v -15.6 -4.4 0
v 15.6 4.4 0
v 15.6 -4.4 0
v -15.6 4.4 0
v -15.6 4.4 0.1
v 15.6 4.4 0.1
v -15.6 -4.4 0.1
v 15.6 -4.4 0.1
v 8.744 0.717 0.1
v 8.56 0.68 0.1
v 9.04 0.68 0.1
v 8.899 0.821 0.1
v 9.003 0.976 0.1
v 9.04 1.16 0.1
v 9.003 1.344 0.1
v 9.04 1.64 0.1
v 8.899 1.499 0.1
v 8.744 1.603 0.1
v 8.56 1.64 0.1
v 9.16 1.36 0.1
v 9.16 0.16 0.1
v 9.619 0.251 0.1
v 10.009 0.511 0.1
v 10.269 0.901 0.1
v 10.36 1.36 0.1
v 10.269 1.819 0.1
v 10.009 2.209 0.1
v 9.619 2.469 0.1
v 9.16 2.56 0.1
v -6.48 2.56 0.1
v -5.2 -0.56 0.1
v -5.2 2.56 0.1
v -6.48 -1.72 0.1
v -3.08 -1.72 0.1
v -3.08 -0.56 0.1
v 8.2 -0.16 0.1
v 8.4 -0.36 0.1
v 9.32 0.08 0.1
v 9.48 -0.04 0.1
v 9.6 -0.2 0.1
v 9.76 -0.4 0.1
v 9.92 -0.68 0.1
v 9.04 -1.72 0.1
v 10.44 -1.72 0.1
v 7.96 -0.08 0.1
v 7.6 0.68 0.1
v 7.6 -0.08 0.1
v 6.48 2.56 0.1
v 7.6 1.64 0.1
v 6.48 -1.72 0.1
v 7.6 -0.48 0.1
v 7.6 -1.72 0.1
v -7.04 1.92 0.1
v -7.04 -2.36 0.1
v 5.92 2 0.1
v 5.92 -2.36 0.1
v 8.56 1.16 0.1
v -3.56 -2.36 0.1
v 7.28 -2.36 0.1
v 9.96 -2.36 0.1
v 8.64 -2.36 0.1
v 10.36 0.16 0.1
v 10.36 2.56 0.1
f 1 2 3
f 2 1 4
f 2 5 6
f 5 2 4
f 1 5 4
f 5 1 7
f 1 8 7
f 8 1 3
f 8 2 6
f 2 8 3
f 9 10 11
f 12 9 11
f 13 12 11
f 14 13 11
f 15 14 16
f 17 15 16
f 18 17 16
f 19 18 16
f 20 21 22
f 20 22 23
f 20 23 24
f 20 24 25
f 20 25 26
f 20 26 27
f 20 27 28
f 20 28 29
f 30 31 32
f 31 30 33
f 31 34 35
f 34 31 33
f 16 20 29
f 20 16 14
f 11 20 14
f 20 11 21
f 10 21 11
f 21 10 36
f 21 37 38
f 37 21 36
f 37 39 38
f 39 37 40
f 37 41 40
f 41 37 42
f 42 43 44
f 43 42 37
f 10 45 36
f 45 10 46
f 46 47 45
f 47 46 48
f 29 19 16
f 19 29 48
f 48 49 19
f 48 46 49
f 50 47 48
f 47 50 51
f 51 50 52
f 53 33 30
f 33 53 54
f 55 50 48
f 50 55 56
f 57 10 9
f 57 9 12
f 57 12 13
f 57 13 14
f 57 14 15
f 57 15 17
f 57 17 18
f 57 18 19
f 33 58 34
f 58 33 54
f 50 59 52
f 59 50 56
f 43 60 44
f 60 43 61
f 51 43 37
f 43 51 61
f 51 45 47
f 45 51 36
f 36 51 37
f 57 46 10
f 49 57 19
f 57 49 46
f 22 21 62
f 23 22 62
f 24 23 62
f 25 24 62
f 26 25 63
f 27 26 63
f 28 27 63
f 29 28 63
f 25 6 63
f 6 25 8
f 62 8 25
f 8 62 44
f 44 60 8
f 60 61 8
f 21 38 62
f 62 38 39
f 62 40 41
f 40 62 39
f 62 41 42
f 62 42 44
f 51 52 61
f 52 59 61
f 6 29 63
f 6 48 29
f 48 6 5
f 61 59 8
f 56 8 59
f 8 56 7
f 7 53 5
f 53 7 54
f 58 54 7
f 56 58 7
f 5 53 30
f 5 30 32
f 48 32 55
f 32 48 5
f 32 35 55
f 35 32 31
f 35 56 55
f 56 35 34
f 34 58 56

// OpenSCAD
// file: ../p/4-4edge.scad
use <../lib.scad>
$fa=1; $fs=0.2;
function ldraw_lib__4_4edge(realsolid=false) = [
// 0 Circle 1.0
// 0 Name: 4-4edge.dat
// 0 Author: James Jessiman
// 0 !LDRAW_ORG Primitive UPDATE 2017-01
// 0 !LICENSE Licensed under CC BY 2.0 and CC BY 4.0 : see CAreadme.txt
// 
// 0 BFC CERTIFY CCW
  [0,"BFC","CERTIFY"],
  [0,"BFC","CCW"],
// 
// 0 !HISTORY 1998-12-15 [PTadmin] Official Update 1998-10
// 0 !HISTORY 2005-12-28 [PTadmin] Official Update 2005-01
// 0 !HISTORY 2007-06-24 [PTadmin] Header formatted for Contributor Agreement
// 0 !HISTORY 2008-07-01 [PTadmin] Official Update 2008-01
// 0 !HISTORY 2017-01-15 [Steffen] BFCed
// 0 !HISTORY 2017-12-30 [PTadmin] Official Update 2017-01
// 
// 
// 2 24 1 0 0 0.9239 0 0.3827
  [2,24,1,0,0,0.9239,0,0.3827],
// 2 24 0.9239 0 0.3827 0.7071 0 0.7071
  [2,24,0.9239,0,0.3827,0.7071,0,0.7071],
// 2 24 0.7071 0 0.7071 0.3827 0 0.9239
  [2,24,0.7071,0,0.7071,0.3827,0,0.9239],
// 2 24 0.3827 0 0.9239 0 0 1
  [2,24,0.3827,0,0.9239,0,0,1],
// 2 24 0 0 1 -0.3827 0 0.9239
  [2,24,0,0,1,-0.3827,0,0.9239],
// 2 24 -0.3827 0 0.9239 -0.7071 0 0.7071
  [2,24,-0.3827,0,0.9239,-0.7071,0,0.7071],
// 2 24 -0.7071 0 0.7071 -0.9239 0 0.3827
  [2,24,-0.7071,0,0.7071,-0.9239,0,0.3827],
// 2 24 -0.9239 0 0.3827 -1 0 -0
  [2,24,-0.9239,0,0.3827,-1,0,-0],
// 2 24 -1 0 -0 -0.9239 0 -0.3827
  [2,24,-1,0,-0,-0.9239,0,-0.3827],
// 2 24 -0.9239 0 -0.3827 -0.7071 0 -0.7071
  [2,24,-0.9239,0,-0.3827,-0.7071,0,-0.7071],
// 2 24 -0.7071 0 -0.7071 -0.3827 0 -0.9239
  [2,24,-0.7071,0,-0.7071,-0.3827,0,-0.9239],
// 2 24 -0.3827 0 -0.9239 0 0 -1
  [2,24,-0.3827,0,-0.9239,0,0,-1],
// 2 24 0 0 -1 0.3827 0 -0.9239
  [2,24,0,0,-1,0.3827,0,-0.9239],
// 2 24 0.3827 0 -0.9239 0.7071 0 -0.7071
  [2,24,0.3827,0,-0.9239,0.7071,0,-0.7071],
// 2 24 0.7071 0 -0.7071 0.9239 0 -0.3827
  [2,24,0.7071,0,-0.7071,0.9239,0,-0.3827],
// 2 24 0.9239 0 -0.3827 1 0 0
  [2,24,0.9239,0,-0.3827,1,0,0],
];
module ldraw_lib__4_4edge(step=0, col=false, unit=2/5, alt=false, line=0.2, solid=!$preview)
    makepoly(ldraw_lib__4_4edge(solid), step=step, col=col, unit=unit, alt=alt, line=line, solid=solid);
ldraw_lib__4_4edge(line=0.2);
// file: ../p/4-4disc.scad
use <../lib.scad>
$fa=1; $fs=0.2;
function ldraw_lib__4_4disc(realsolid=false) = [
// 0 Disc 1.0
// 0 Name: 4-4disc.dat
// 0 Author: James Jessiman
// 0 !LDRAW_ORG Primitive UPDATE 2002-02
// 0 !LICENSE Licensed under CC BY 2.0 and CC BY 4.0 : see CAreadme.txt
// 
// 0 BFC CERTIFY CCW
  [0,"BFC","CERTIFY"],
  [0,"BFC","CCW"],
// 
// 0 !HISTORY 1998-12-15 [PTadmin] Official Update 1998-10
// 0 !HISTORY 2002-03-23 [sbliss] Added BFC statement
// 0 !HISTORY 2002-04-25 [PTadmin] Official Update 2002-02
// 0 !HISTORY 2007-06-24 [PTadmin] Header formatted for Contributor Agreement
// 0 !HISTORY 2008-07-01 [PTadmin] Official Update 2008-01
// 
// 
// 3 16 0 0 0 1 0 0 0.9239 0 0.3827
  [3,16,0,0,0,1,0,0,0.9239,0,0.3827],
// 3 16 0 0 0 0.9239 0 0.3827 0.7071 0 0.7071
  [3,16,0,0,0,0.9239,0,0.3827,0.7071,0,0.7071],
// 3 16 0 0 0 0.7071 0 0.7071 0.3827 0 0.9239
  [3,16,0,0,0,0.7071,0,0.7071,0.3827,0,0.9239],
// 3 16 0 0 0 0.3827 0 0.9239 0 0 1
  [3,16,0,0,0,0.3827,0,0.9239,0,0,1],
// 3 16 0 0 0 0 0 1 -0.3827 0 0.9239
  [3,16,0,0,0,0,0,1,-0.3827,0,0.9239],
// 3 16 0 0 0 -0.3827 0 0.9239 -0.7071 0 0.7071
  [3,16,0,0,0,-0.3827,0,0.9239,-0.7071,0,0.7071],
// 3 16 0 0 0 -0.7071 0 0.7071 -0.9239 0 0.3827
  [3,16,0,0,0,-0.7071,0,0.7071,-0.9239,0,0.3827],
// 3 16 0 0 0 -0.9239 0 0.3827 -1 0 -0
  [3,16,0,0,0,-0.9239,0,0.3827,-1,0,-0],
// 3 16 0 0 0 -1 0 -0 -0.9239 0 -0.3827
  [3,16,0,0,0,-1,0,-0,-0.9239,0,-0.3827],
// 3 16 0 0 0 -0.9239 0 -0.3827 -0.7071 0 -0.7071
  [3,16,0,0,0,-0.9239,0,-0.3827,-0.7071,0,-0.7071],
// 3 16 0 0 0 -0.7071 0 -0.7071 -0.3827 0 -0.9239
  [3,16,0,0,0,-0.7071,0,-0.7071,-0.3827,0,-0.9239],
// 3 16 0 0 0 -0.3827 0 -0.9239 0 0 -1
  [3,16,0,0,0,-0.3827,0,-0.9239,0,0,-1],
// 3 16 0 0 0 0 0 -1 0.3827 0 -0.9239
  [3,16,0,0,0,0,0,-1,0.3827,0,-0.9239],
// 3 16 0 0 0 0.3827 0 -0.9239 0.7071 0 -0.7071
  [3,16,0,0,0,0.3827,0,-0.9239,0.7071,0,-0.7071],
// 3 16 0 0 0 0.7071 0 -0.7071 0.9239 0 -0.3827
  [3,16,0,0,0,0.7071,0,-0.7071,0.9239,0,-0.3827],
// 3 16 0 0 0 0.9239 0 -0.3827 1 0 0
  [3,16,0,0,0,0.9239,0,-0.3827,1,0,0],
// 0
];
module ldraw_lib__4_4disc(step=0, col=false, unit=2/5, alt=false, line=0.2, solid=!$preview)
    makepoly(ldraw_lib__4_4disc(solid), step=step, col=col, unit=unit, alt=alt, line=line, solid=solid);
ldraw_lib__4_4disc(line=0.2);
// file: ../p/4-4cyli.scad
use <../lib.scad>
$fa=1; $fs=0.2;
function ldraw_lib__4_4cyli(realsolid=false) = [
// 0 Cylinder 1.0
// 0 Name: 4-4cyli.dat
// 0 Author: James Jessiman
// 0 !LDRAW_ORG Primitive UPDATE 2005-01
// 0 !LICENSE Licensed under CC BY 2.0 and CC BY 4.0 : see CAreadme.txt
// 
// 0 BFC CERTIFY CCW
  [0,"BFC","CERTIFY"],
  [0,"BFC","CCW"],
// 
// 0 !HISTORY 1998-12-15 [PTadmin] Official Update 1998-10
// 0 !HISTORY 2002-03-23 [sbliss] Added BFC statement; merged headers from files in distributions LDraw 0.27 and Complete.
// 0 !HISTORY 2002-04-25 [PTadmin] Official Update 2002-02
// 0 !HISTORY 2004-12-14 [guyvivan] BFC CCW
// 0 !HISTORY 2005-12-28 [PTadmin] Official Update 2005-01
// 0 !HISTORY 2007-06-24 [PTadmin] Header formatted for Contributor Agreement
// 0 !HISTORY 2008-07-01 [PTadmin] Official Update 2008-01
// 
// 
// 4 16 1 1 0 0.9239 1 0.3827 0.9239 0 0.3827 1 0 0
  [4,16,1,1,0,0.9239,1,0.3827,0.9239,0,0.3827,1,0,0],
// 5 24 1 0 0 1 1 0 0.9239 0 0.3827 0.9239 0 -0.3827
  [5,24,1,0,0,1,1,0,0.9239,0,0.3827,0.9239,0,-0.3827],
// 4 16 0.9239 1 0.3827 0.7071 1 0.7071 0.7071 0 0.7071 0.9239 0 0.3827
  [4,16,0.9239,1,0.3827,0.7071,1,0.7071,0.7071,0,0.7071,0.9239,0,0.3827],
// 5 24 0.9239 0 0.3827 0.9239 1 0.3827 0.7071 0 0.7071 1 0 0
  [5,24,0.9239,0,0.3827,0.9239,1,0.3827,0.7071,0,0.7071,1,0,0],
// 4 16 0.7071 1 0.7071 0.3827 1 0.9239 0.3827 0 0.9239 0.7071 0 0.7071
  [4,16,0.7071,1,0.7071,0.3827,1,0.9239,0.3827,0,0.9239,0.7071,0,0.7071],
// 5 24 0.7071 0 0.7071 0.7071 1 0.7071 0.3827 0 0.9239 0.9239 0 0.3827
  [5,24,0.7071,0,0.7071,0.7071,1,0.7071,0.3827,0,0.9239,0.9239,0,0.3827],
// 4 16 0.3827 1 0.9239 0 1 1 0 0 1 0.3827 0 0.9239
  [4,16,0.3827,1,0.9239,0,1,1,0,0,1,0.3827,0,0.9239],
// 5 24 0.3827 0 0.9239 0.3827 1 0.9239 0 0 1 0.7071 0 0.7071
  [5,24,0.3827,0,0.9239,0.3827,1,0.9239,0,0,1,0.7071,0,0.7071],
// 4 16 0 1 1 -0.3827 1 0.9239 -0.3827 0 0.9239 0 0 1
  [4,16,0,1,1,-0.3827,1,0.9239,-0.3827,0,0.9239,0,0,1],
// 5 24 0 0 1 0 1 1 -0.3827 0 0.9239 0.3827 0 0.9239
  [5,24,0,0,1,0,1,1,-0.3827,0,0.9239,0.3827,0,0.9239],
// 4 16 -0.3827 1 0.9239 -0.7071 1 0.7071 -0.7071 0 0.7071 -0.3827 0 0.9239
  [4,16,-0.3827,1,0.9239,-0.7071,1,0.7071,-0.7071,0,0.7071,-0.3827,0,0.9239],
// 5 24 -0.3827 0 0.9239 -0.3827 1 0.9239 -0.7071 0 0.7071 0 0 1
  [5,24,-0.3827,0,0.9239,-0.3827,1,0.9239,-0.7071,0,0.7071,0,0,1],
// 4 16 -0.7071 1 0.7071 -0.9239 1 0.3827 -0.9239 0 0.3827 -0.7071 0 0.7071
  [4,16,-0.7071,1,0.7071,-0.9239,1,0.3827,-0.9239,0,0.3827,-0.7071,0,0.7071],
// 5 24 -0.7071 0 0.7071 -0.7071 1 0.7071 -0.9239 0 0.3827 -0.3827 0 0.9239
  [5,24,-0.7071,0,0.7071,-0.7071,1,0.7071,-0.9239,0,0.3827,-0.3827,0,0.9239],
// 4 16 -0.9239 1 0.3827 -1 1 0 -1 0 0 -0.9239 0 0.3827
  [4,16,-0.9239,1,0.3827,-1,1,0,-1,0,0,-0.9239,0,0.3827],
// 5 24 -0.9239 0 0.3827 -0.9239 1 0.3827 -1 0 0 -0.7071 0 0.7071
  [5,24,-0.9239,0,0.3827,-0.9239,1,0.3827,-1,0,0,-0.7071,0,0.7071],
// 4 16 -1 1 0 -0.9239 1 -0.3827 -0.9239 0 -0.3827 -1 0 0
  [4,16,-1,1,0,-0.9239,1,-0.3827,-0.9239,0,-0.3827,-1,0,0],
// 5 24 -1 0 0 -1 1 0 -0.9239 0 -0.3827 -0.9239 0 0.3827
  [5,24,-1,0,0,-1,1,0,-0.9239,0,-0.3827,-0.9239,0,0.3827],
// 4 16 -0.9239 1 -0.3827 -0.7071 1 -0.7071 -0.7071 0 -0.7071 -0.9239 0 -0.3827
  [4,16,-0.9239,1,-0.3827,-0.7071,1,-0.7071,-0.7071,0,-0.7071,-0.9239,0,-0.3827],
// 5 24 -0.9239 0 -0.3827 -0.9239 1 -0.3827 -0.7071 0 -0.7071 -1 0 0
  [5,24,-0.9239,0,-0.3827,-0.9239,1,-0.3827,-0.7071,0,-0.7071,-1,0,0],
// 4 16 -0.7071 1 -0.7071 -0.3827 1 -0.9239 -0.3827 0 -0.9239 -0.7071 0 -0.7071
  [4,16,-0.7071,1,-0.7071,-0.3827,1,-0.9239,-0.3827,0,-0.9239,-0.7071,0,-0.7071],
// 5 24 -0.7071 0 -0.7071 -0.7071 1 -0.7071 -0.3827 0 -0.9239 -0.9239 0 -0.3827
  [5,24,-0.7071,0,-0.7071,-0.7071,1,-0.7071,-0.3827,0,-0.9239,-0.9239,0,-0.3827],
// 4 16 -0.3827 1 -0.9239 0 1 -1 0 0 -1 -0.3827 0 -0.9239
  [4,16,-0.3827,1,-0.9239,0,1,-1,0,0,-1,-0.3827,0,-0.9239],
// 5 24 -0.3827 0 -0.9239 -0.3827 1 -0.9239 0 0 -1 -0.7071 0 -0.7071
  [5,24,-0.3827,0,-0.9239,-0.3827,1,-0.9239,0,0,-1,-0.7071,0,-0.7071],
// 4 16 0 1 -1 0.3827 1 -0.9239 0.3827 0 -0.9239 0 0 -1
  [4,16,0,1,-1,0.3827,1,-0.9239,0.3827,0,-0.9239,0,0,-1],
// 5 24 0 0 -1 0 1 -1 0.3827 0 -0.9239 -0.3827 0 -0.9239
  [5,24,0,0,-1,0,1,-1,0.3827,0,-0.9239,-0.3827,0,-0.9239],
// 4 16 0.3827 1 -0.9239 0.7071 1 -0.7071 0.7071 0 -0.7071 0.3827 0 -0.9239
  [4,16,0.3827,1,-0.9239,0.7071,1,-0.7071,0.7071,0,-0.7071,0.3827,0,-0.9239],
// 5 24 0.3827 0 -0.9239 0.3827 1 -0.9239 0.7071 0 -0.7071 0 0 -1
  [5,24,0.3827,0,-0.9239,0.3827,1,-0.9239,0.7071,0,-0.7071,0,0,-1],
// 4 16 0.7071 1 -0.7071 0.9239 1 -0.3827 0.9239 0 -0.3827 0.7071 0 -0.7071
  [4,16,0.7071,1,-0.7071,0.9239,1,-0.3827,0.9239,0,-0.3827,0.7071,0,-0.7071],
// 5 24 0.7071 0 -0.7071 0.7071 1 -0.7071 0.9239 0 -0.3827 0.3827 0 -0.9239
  [5,24,0.7071,0,-0.7071,0.7071,1,-0.7071,0.9239,0,-0.3827,0.3827,0,-0.9239],
// 4 16 0.9239 1 -0.3827 1 1 0 1 0 0 0.9239 0 -0.3827
  [4,16,0.9239,1,-0.3827,1,1,0,1,0,0,0.9239,0,-0.3827],
// 5 24 0.9239 0 -0.3827 0.9239 1 -0.3827 1 0 0 0.7071 0 -0.7071
  [5,24,0.9239,0,-0.3827,0.9239,1,-0.3827,1,0,0,0.7071,0,-0.7071],
// 0
];
module ldraw_lib__4_4cyli(step=0, col=false, unit=2/5, alt=false, line=0.2, solid=!$preview)
    makepoly(ldraw_lib__4_4cyli(solid), step=step, col=col, unit=unit, alt=alt, line=line, solid=solid);
ldraw_lib__4_4cyli(line=0.2);
// file: ../p/stud3.scad
use <../lib.scad>
use <4-4cyli.scad>
use <4-4disc.scad>
use <4-4edge.scad>
$fa=1; $fs=0.2;
function ldraw_lib__stud3(realsolid=false) = realsolid ? 
    [openscad(translate([0,0,-eps()], o=cylinder(4+eps(), r=4)),2)] : [
// 0 Stud Tube Solid
// 0 Name: stud3.dat
// 0 Author: James Jessiman
// 0 !LDRAW_ORG Primitive UPDATE 2012-01
// 0 !LICENSE Licensed under CC BY 2.0 and CC BY 4.0 : see CAreadme.txt
// 
// 0 BFC CERTIFY CCW
  [0,"BFC","CERTIFY"],
  [0,"BFC","CCW"],
// 
// 0 !HISTORY 2002-04-04 [sbliss] Modified for BFC compliance
// 0 !HISTORY 2002-04-25 [PTadmin] Official Update 2002-02
// 0 !HISTORY 2007-06-24 [PTadmin] Header formatted for Contributor Agreement
// 0 !HISTORY 2008-07-01 [PTadmin] Official Update 2008-01
// 0 !HISTORY 2012-02-16 [Philo] Changed to CCW
// 0 !HISTORY 2012-03-30 [PTadmin] Official Update 2012-01
// 
// 
// 1 16 0 -4 0 4 0 0 0 1 0 0 0 4 4-4edge.dat
  [1,16,0,-4,0,4,0,0,0,1,0,0,0,4, ldraw_lib__4_4edge(realsolid)],
// 1 16 0 0 0 4 0 0 0 1 0 0 0 4 4-4edge.dat
  [1,16,0,0,0,4,0,0,0,1,0,0,0,4, ldraw_lib__4_4edge(realsolid)],
// 1 16 0 -4 0 4 0 0 0 1 0 0 0 4 4-4disc.dat
  [1,16,0,-4,0,4,0,0,0,1,0,0,0,4, ldraw_lib__4_4disc(realsolid)],
// 1 16 0 -4 0 4 0 0 0 4 0 0 0 4 4-4cyli.dat
  [1,16,0,-4,0,4,0,0,0,4,0,0,0,4, ldraw_lib__4_4cyli(realsolid)],
];
module ldraw_lib__stud3(step=0, col=false, unit=2/5, alt=false, line=0.2, solid=!$preview)
    makepoly(ldraw_lib__stud3(solid), step=step, col=col, unit=unit, alt=alt, line=line, solid=solid);
ldraw_lib__stud3(line=0.2);
// file: ../p/stud.scad
use <../lib.scad>
use <4-4cyli.scad>
use <4-4disc.scad>
use <4-4edge.scad>
$fa=1; $fs=0.2;
function ldraw_lib__stud(realsolid=false) = realsolid ? 
    [openscad(translate([0,0,-eps()], o=cylinder(4+eps(), r=6)),2)] : [
// 0 Stud
// 0 Name: stud.dat
// 0 Author: James Jessiman
// 0 !LDRAW_ORG Primitive UPDATE 2012-01
// 0 !LICENSE Licensed under CC BY 2.0 and CC BY 4.0 : see CAreadme.txt
// 
// 0 BFC CERTIFY CCW
  [0,"BFC","CERTIFY"],
  [0,"BFC","CCW"],
// 
// 0 !HISTORY 2002-04-04 [sbliss] Modified for BFC compliance
// 0 !HISTORY 2002-04-25 [PTadmin] Official Update 2002-02
// 0 !HISTORY 2007-06-24 [PTadmin] Header formatted for Contributor Agreement
// 0 !HISTORY 2008-07-01 [PTadmin] Official Update 2008-01
// 0 !HISTORY 2012-02-16 [Philo] Changed to CCW
// 0 !HISTORY 2012-03-30 [PTadmin] Official Update 2012-01
// 
// 
// 1 16 0 0 0 6 0 0 0 1 0 0 0 6 4-4edge.dat
  [1,16,0,0,0,6,0,0,0,1,0,0,0,6, ldraw_lib__4_4edge(realsolid)],
// 1 16 0 -4 0 6 0 0 0 1 0 0 0 6 4-4edge.dat
  [1,16,0,-4,0,6,0,0,0,1,0,0,0,6, ldraw_lib__4_4edge(realsolid)],
// 1 16 0 0 0 6 0 0 0 -4 0 0 0 6 4-4cyli.dat
  [1,16,0,0,0,6,0,0,0,-4,0,0,0,6, ldraw_lib__4_4cyli(realsolid)],
// 1 16 0 -4 0 6 0 0 0 1 0 0 0 6 4-4disc.dat
  [1,16,0,-4,0,6,0,0,0,1,0,0,0,6, ldraw_lib__4_4disc(realsolid)],
];
module ldraw_lib__stud(step=0, col=false, unit=2/5, alt=false, line=0.2, solid=!$preview)
    makepoly(ldraw_lib__stud(solid), step=step, col=col, unit=unit, alt=alt, line=line, solid=solid);
ldraw_lib__stud(line=0.2);
// file: ../p/box5.scad
use <../lib.scad>
$fa=1; $fs=0.2;
function ldraw_lib__box5(realsolid=false) = [
// 0 Box with 5 Faces and All Edges
// 0 Name: box5.dat
// 0 Author: James Jessiman
// 0 !LDRAW_ORG Primitive UPDATE 2012-01
// 0 !LICENSE Licensed under CC BY 2.0 and CC BY 4.0 : see CAreadme.txt
// 
// 0 BFC CERTIFY CCW
  [0,"BFC","CERTIFY"],
  [0,"BFC","CCW"],
// 
// 0 !HISTORY 2002-04-03 [sbliss] Modified for BFC compliance
// 0 !HISTORY 2002-04-25 [PTadmin] Official Update 2002-02
// 0 !HISTORY 2007-06-24 [PTadmin] Header formatted for Contributor Agreement
// 0 !HISTORY 2008-07-01 [PTadmin] Official Update 2008-01
// 0 !HISTORY 2012-02-16 [Philo] Changed to CCW
// 0 !HISTORY 2012-03-30 [PTadmin] Official Update 2012-01
// 
// 
// 2 24 1 1 1 -1 1 1
  [2,24,1,1,1,-1,1,1],
// 2 24 -1 1 1 -1 1 -1
  [2,24,-1,1,1,-1,1,-1],
// 2 24 -1 1 -1 1 1 -1
  [2,24,-1,1,-1,1,1,-1],
// 2 24 1 1 -1 1 1 1
  [2,24,1,1,-1,1,1,1],
// 2 24 1 0 1 -1 0 1
  [2,24,1,0,1,-1,0,1],
// 2 24 -1 0 1 -1 0 -1
  [2,24,-1,0,1,-1,0,-1],
// 2 24 -1 0 -1 1 0 -1
  [2,24,-1,0,-1,1,0,-1],
// 2 24 1 0 -1 1 0 1
  [2,24,1,0,-1,1,0,1],
// 2 24 1 0 1 1 1 1
  [2,24,1,0,1,1,1,1],
// 2 24 -1 0 1 -1 1 1
  [2,24,-1,0,1,-1,1,1],
// 2 24 1 0 -1 1 1 -1
  [2,24,1,0,-1,1,1,-1],
// 2 24 -1 0 -1 -1 1 -1
  [2,24,-1,0,-1,-1,1,-1],
// 4 16 -1 1 1 1 1 1 1 1 -1 -1 1 -1
  [4,16,-1,1,1,1,1,1,1,1,-1,-1,1,-1],
// 4 16 -1 1 1 -1 0 1 1 0 1 1 1 1
  [4,16,-1,1,1,-1,0,1,1,0,1,1,1,1],
// 4 16 -1 1 -1 -1 0 -1 -1 0 1 -1 1 1
  [4,16,-1,1,-1,-1,0,-1,-1,0,1,-1,1,1],
// 4 16 1 1 -1 1 0 -1 -1 0 -1 -1 1 -1
  [4,16,1,1,-1,1,0,-1,-1,0,-1,-1,1,-1],
// 4 16 1 1 1 1 0 1 1 0 -1 1 1 -1
  [4,16,1,1,1,1,0,1,1,0,-1,1,1,-1],
];
module ldraw_lib__box5(step=0, col=false, unit=2/5, alt=false, line=0.2, solid=!$preview)
    makepoly(ldraw_lib__box5(solid), step=step, col=col, unit=unit, alt=alt, line=line, solid=solid);
ldraw_lib__box5(line=0.2);
// file: ../p/box4t.scad
use <../lib.scad>
$fa=1; $fs=0.2;
function ldraw_lib__box4t(realsolid=false) = [
// 0 Box with 4 Adjacent Faces and All Edges
// 0 Name: box4t.dat
// 0 Author: Tore Eriksson [Tore_Eriksson]
// 0 !LDRAW_ORG Primitive UPDATE 2003-02
// 0 !LICENSE Licensed under CC BY 2.0 and CC BY 4.0 : see CAreadme.txt
// 
// 0 BFC CERTIFY CCW
  [0,"BFC","CERTIFY"],
  [0,"BFC","CCW"],
// 
// 0 !HISTORY 1997-09-29 [PTadmin] Official Update 1997-15
// 0 !HISTORY 2002-08-31 [izanette] Modified with WINDZ for BFC compliance
// 0 !HISTORY 2003-08-01 [PTadmin] Official Update 2003-02
// 0 !HISTORY 2007-06-24 [PTadmin] Header formatted for Contributor Agreement
// 0 !HISTORY 2008-07-01 [PTadmin] Official Update 2008-01
// 
// 
// 2 24 1 1 1 -1 1 1
  [2,24,1,1,1,-1,1,1],
// 2 24 -1 1 1 -1 1 -1
  [2,24,-1,1,1,-1,1,-1],
// 2 24 -1 1 -1 1 1 -1
  [2,24,-1,1,-1,1,1,-1],
// 2 24 1 1 -1 1 1 1
  [2,24,1,1,-1,1,1,1],
// 2 24 1 0 1 -1 0 1
  [2,24,1,0,1,-1,0,1],
// 2 24 -1 0 1 -1 0 -1
  [2,24,-1,0,1,-1,0,-1],
// 2 24 -1 0 -1 1 0 -1
  [2,24,-1,0,-1,1,0,-1],
// 2 24 1 0 -1 1 0 1
  [2,24,1,0,-1,1,0,1],
// 2 24 1 0 1 1 1 1
  [2,24,1,0,1,1,1,1],
// 2 24 -1 0 1 -1 1 1
  [2,24,-1,0,1,-1,1,1],
// 2 24 1 0 -1 1 1 -1
  [2,24,1,0,-1,1,1,-1],
// 2 24 -1 0 -1 -1 1 -1
  [2,24,-1,0,-1,-1,1,-1],
// 4 16 1 1 1 1 1 -1 -1 1 -1 -1 1 1
  [4,16,1,1,1,1,1,-1,-1,1,-1,-1,1,1],
// 4 16 1 1 1 -1 1 1 -1 0 1 1 0 1
  [4,16,1,1,1,-1,1,1,-1,0,1,1,0,1],
// 4 16 -1 1 1 -1 1 -1 -1 0 -1 -1 0 1
  [4,16,-1,1,1,-1,1,-1,-1,0,-1,-1,0,1],
// 0 4 16 -1 1 -1 -1 0 -1 1 0 -1 1 1 -1
// 4 16 1 1 -1 1 1 1 1 0 1 1 0 -1
  [4,16,1,1,-1,1,1,1,1,0,1,1,0,-1],
// 0
];
module ldraw_lib__box4t(step=0, col=false, unit=2/5, alt=false, line=0.2, solid=!$preview)
    makepoly(ldraw_lib__box4t(solid), step=step, col=col, unit=unit, alt=alt, line=line, solid=solid);
ldraw_lib__box4t(line=0.2);
// file: s/3004s01.scad
use <../../lib.scad>
use <../../p/box4t.scad>
use <../../p/box5.scad>
use <../../p/stud.scad>
use <../../p/stud3.scad>
$fa=1; $fs=0.2;
function ldraw_lib__s__3004s01(realsolid=false) = [
// 0 ~Brick  1 x  2 without Front Face
// 0 Name: s\3004s01.dat
// 0 Author: James Jessiman
// 0 !LDRAW_ORG Subpart UPDATE 2003-03
// 0 !LICENSE Licensed under CC BY 2.0 and CC BY 4.0 : see CAreadme.txt
// 
// 0 BFC CERTIFY CCW
  [0,"BFC","CERTIFY"],
  [0,"BFC","CCW"],
// 
// 0 !HISTORY 2003-09-07 [jriley] Subfiling, BFC
// 0 !HISTORY 2003-12-19 [PTadmin] Official Update 2003-03
// 0 !HISTORY 2007-08-29 [PTadmin] Header formatted for Contributor Agreement
// 0 !HISTORY 2008-07-01 [PTadmin] Official Update 2008-01
// 
// 
// 1 16 0 4 0 1 0 0 0 -5 0 0 0 1 stud3.dat
  [1,16,0,4,0,1,0,0,0,-5,0,0,0,1, ldraw_lib__stud3(realsolid)],
// 0 BFC INVERTNEXT
  [0,"BFC","INVERTNEXT"],
// 1 16 0 24 0 16 0 0 0 -20 0 0 0 6 box5.dat
  [1,16,0,24,0,16,0,0,0,-20,0,0,0,6, ldraw_lib__box5(realsolid)],
// 4 16 20 24 10 16 24 6 -16 24 6 -20 24 10
  [4,16,20,24,10,16,24,6,-16,24,6,-20,24,10],
// 4 16 -20 24 10 -16 24 6 -16 24 -6 -20 24 -10
  [4,16,-20,24,10,-16,24,6,-16,24,-6,-20,24,-10],
// 4 16 -20 24 -10 -16 24 -6 16 24 -6 20 24 -10
  [4,16,-20,24,-10,-16,24,-6,16,24,-6,20,24,-10],
// 4 16 20 24 -10 16 24 -6 16 24 6 20 24 10
  [4,16,20,24,-10,16,24,-6,16,24,6,20,24,10],
// 1 16 0 24 0 20 0 0 0 -24 0 0 0 10 box4t.dat
  [1,16,0,24,0,20,0,0,0,-24,0,0,0,10, ldraw_lib__box4t(realsolid)],
// 1 16 10 0 0 1 0 0 0 1 0 0 0 1 stud.dat
  [1,16,10,0,0,1,0,0,0,1,0,0,0,1, ldraw_lib__stud(realsolid)],
// 1 16 -10 0 0 1 0 0 0 1 0 0 0 1 stud.dat
  [1,16,-10,0,0,1,0,0,0,1,0,0,0,1, ldraw_lib__stud(realsolid)],
// 0
];
module ldraw_lib__s__3004s01(step=0, col=false, unit=2/5, alt=false, line=0.2, solid=!$preview)
    makepoly(ldraw_lib__s__3004s01(solid), step=step, col=col, unit=unit, alt=alt, line=line, solid=solid);
ldraw_lib__s__3004s01(line=0.2);
// file: 3004.scad
use <../lib.scad>
use <s/3004s01.scad>
$fa=1; $fs=0.2;
function ldraw_lib__3004(realsolid=false) = [
// 0 Brick  1 x  2
// 0 Name: 3004.dat
// 0 Author: James Jessiman
// 0 !LDRAW_ORG Part UPDATE 2022-05
// 0 !LICENSE Licensed under CC BY 2.0 and CC BY 4.0 : see CAreadme.txt
// 
// 0 BFC CERTIFY CCW
  [0,"BFC","CERTIFY"],
  [0,"BFC","CCW"],
// 
// 0 !HISTORY 2001-10-26 [PTadmin] Official Update 2001-01
// 0 !HISTORY 2002-05-07 {unknown} BFC Certification
// 0 !HISTORY 2002-06-11 [PTadmin] Official Update 2002-03
// 0 !HISTORY 2007-05-07 [PTadmin] Header formatted for Contributor Agreement
// 0 !HISTORY 2008-07-01 [PTadmin] Official Update 2008-01
// 0 !HISTORY 2022-08-04 [MagFors] Using subfile
// 0 !HISTORY 2022-09-15 [PTadmin] Official Update 2022-05
// 
// 
// 1 16 0 0 0 1 0 0 0 1 0 0 0 1 s\3004s01.dat
  [1,16,0,0,0,1,0,0,0,1,0,0,0,1, ldraw_lib__s__3004s01(realsolid)],
// 4 16 -20 24 -10 20 24 -10 20 0 -10 -20 0 -10
  [4,16,-20,24,-10,20,24,-10,20,0,-10,-20,0,-10],
];
module ldraw_lib__3004(step=0, col=false, unit=2/5, alt=false, line=0.2, solid=!$preview)
    makepoly(ldraw_lib__3004(solid), step=step, col=col, unit=unit, alt=alt, line=line, solid=solid);
ldraw_lib__3004(line=0.2);
// file: ../p/box5-12.scad
use <../lib.scad>
$fa=1; $fs=0.2;
function ldraw_lib__box5_12(realsolid=false) = [
// 0 Box with 5 Faces without Any Edges
// 0 Name: box5-12.dat
// 0 Author: Chris Dee [cwdee]
// 0 !LDRAW_ORG Primitive UPDATE 2009-02
// 0 !LICENSE Licensed under CC BY 2.0 and CC BY 4.0 : see CAreadme.txt
// 
// 0 BFC CERTIFY CCW
  [0,"BFC","CERTIFY"],
  [0,"BFC","CCW"],
// 
// 0 !HISTORY 2009-09-03 [PTadmin] Official Update 2009-02
// 
// 
// 4 16 1 1 1 1 1 -1 -1 1 -1 -1 1 1
  [4,16,1,1,1,1,1,-1,-1,1,-1,-1,1,1],
// 4 16 -1 0 1 1 0 1 1 1 1 -1 1 1
  [4,16,-1,0,1,1,0,1,1,1,1,-1,1,1],
// 4 16 -1 0 -1 -1 0 1 -1 1 1 -1 1 -1
  [4,16,-1,0,-1,-1,0,1,-1,1,1,-1,1,-1],
// 4 16 1 0 -1 -1 0 -1 -1 1 -1 1 1 -1
  [4,16,1,0,-1,-1,0,-1,-1,1,-1,1,1,-1],
// 4 16 1 0 1 1 0 -1 1 1 -1 1 1 1
  [4,16,1,0,1,1,0,-1,1,1,-1,1,1,1],
// 0
];
module ldraw_lib__box5_12(step=0, col=false, unit=2/5, alt=false, line=0.2, solid=!$preview)
    makepoly(ldraw_lib__box5_12(solid), step=step, col=col, unit=unit, alt=alt, line=line, solid=solid);
ldraw_lib__box5_12(line=0.2);
// file: ../p/2-4ndis.scad
use <../lib.scad>
$fa=1; $fs=0.2;
function ldraw_lib__2_4ndis(realsolid=false) = [
// 0 Disc Negative 0.5
// 0 Name: 2-4ndis.dat
// 0 Author: James Jessiman
// 0 !LDRAW_ORG Primitive UPDATE 2012-01
// 0 !LICENSE Licensed under CC BY 2.0 and CC BY 4.0 : see CAreadme.txt
// 
// 0 BFC CERTIFY CCW
  [0,"BFC","CERTIFY"],
  [0,"BFC","CCW"],
// 
// 0 !HISTORY 2002-03-23 [sbliss] Added BFC statement; compacted code
// 0 !HISTORY 2002-04-25 [PTadmin] Official Update 2002-02
// 0 !HISTORY 2007-06-24 [PTadmin] Header formatted for Contributor Agreement
// 0 !HISTORY 2008-07-01 [PTadmin] Official Update 2008-01
// 0 !HISTORY 2012-02-16 [Philo] Changed to CCW
// 0 !HISTORY 2012-03-30 [PTadmin] Official Update 2012-01
// 
// 
// 3 16 0.9239 0 0.3827 1 0 0 1 0 1
  [3,16,0.9239,0,0.3827,1,0,0,1,0,1],
// 3 16 0.7071 0 0.7071 0.9239 0 0.3827 1 0 1
  [3,16,0.7071,0,0.7071,0.9239,0,0.3827,1,0,1],
// 3 16 0.3827 0 0.9239 0.7071 0 0.7071 1 0 1
  [3,16,0.3827,0,0.9239,0.7071,0,0.7071,1,0,1],
// 3 16 0 0 1 0.3827 0 0.9239 1 0 1
  [3,16,0,0,1,0.3827,0,0.9239,1,0,1],
// 3 16 -0.3827 0 0.9239 0 0 1 -1 0 1
  [3,16,-0.3827,0,0.9239,0,0,1,-1,0,1],
// 3 16 -0.7071 0 0.7071 -0.3827 0 0.9239 -1 0 1
  [3,16,-0.7071,0,0.7071,-0.3827,0,0.9239,-1,0,1],
// 3 16 -0.9239 0 0.3827 -0.7071 0 0.7071 -1 0 1
  [3,16,-0.9239,0,0.3827,-0.7071,0,0.7071,-1,0,1],
// 3 16 -1 0 0 -0.9239 0 0.3827 -1 0 1
  [3,16,-1,0,0,-0.9239,0,0.3827,-1,0,1],
];
module ldraw_lib__2_4ndis(step=0, col=false, unit=2/5, alt=false, line=0.2, solid=!$preview)
    makepoly(ldraw_lib__2_4ndis(solid), step=step, col=col, unit=unit, alt=alt, line=line, solid=solid);
ldraw_lib__2_4ndis(line=0.2);
// file: ../p/2-4disc.scad
use <../lib.scad>
$fa=1; $fs=0.2;
function ldraw_lib__2_4disc(realsolid=false) = [
// 0 Disc 0.5
// 0 Name: 2-4disc.dat
// 0 Author: James Jessiman
// 0 !LDRAW_ORG Primitive UPDATE 2002-02
// 0 !LICENSE Licensed under CC BY 2.0 and CC BY 4.0 : see CAreadme.txt
// 
// 0 BFC CERTIFY CCW
  [0,"BFC","CERTIFY"],
  [0,"BFC","CCW"],
// 
// 0 !HISTORY 1998-12-15 [PTadmin] Official Update 1998-10
// 0 !HISTORY 2002-03-23 [sbliss] Added BFC statement
// 0 !HISTORY 2002-04-25 [PTadmin] Official Update 2002-02
// 0 !HISTORY 2007-06-24 [PTadmin] Header formatted for Contributor Agreement
// 0 !HISTORY 2008-07-01 [PTadmin] Official Update 2008-01
// 
// 
// 3 16 0 0 0 1 0 0 0.9239 0 0.3827
  [3,16,0,0,0,1,0,0,0.9239,0,0.3827],
// 3 16 0 0 0 0.9239 0 0.3827 0.7071 0 0.7071
  [3,16,0,0,0,0.9239,0,0.3827,0.7071,0,0.7071],
// 3 16 0 0 0 0.7071 0 0.7071 0.3827 0 0.9239
  [3,16,0,0,0,0.7071,0,0.7071,0.3827,0,0.9239],
// 3 16 0 0 0 0.3827 0 0.9239 0 0 1
  [3,16,0,0,0,0.3827,0,0.9239,0,0,1],
// 3 16 0 0 0 0 0 1 -0.3827 0 0.9239
  [3,16,0,0,0,0,0,1,-0.3827,0,0.9239],
// 3 16 0 0 0 -0.3827 0 0.9239 -0.7071 0 0.7071
  [3,16,0,0,0,-0.3827,0,0.9239,-0.7071,0,0.7071],
// 3 16 0 0 0 -0.7071 0 0.7071 -0.9239 0 0.3827
  [3,16,0,0,0,-0.7071,0,0.7071,-0.9239,0,0.3827],
// 3 16 0 0 0 -0.9239 0 0.3827 -1 0 -0
  [3,16,0,0,0,-0.9239,0,0.3827,-1,0,-0],
// 0
];
module ldraw_lib__2_4disc(step=0, col=false, unit=2/5, alt=false, line=0.2, solid=!$preview)
    makepoly(ldraw_lib__2_4disc(solid), step=step, col=col, unit=unit, alt=alt, line=line, solid=solid);
ldraw_lib__2_4disc(line=0.2);
// main file
use <../lib.scad>
use <../p/2-4disc.scad>
use <../p/2-4ndis.scad>
use <../p/box5-12.scad>
$fa=1; $fs=0.2;
function ldraw_lib__4544258j(realsolid=false) = [
// 0 Sticker  1.1 x  3.9 with "L R"
// 0 Name: 4544258j.dat
// 0 Author: J.C. Tchang [tchang]
// 0 !LDRAW_ORG Part UPDATE 2012-03
// 0 !LICENSE Licensed under CC BY 2.0 and CC BY 4.0 : see CAreadme.txt
// 
// 0 BFC CERTIFY CCW
  [0,"BFC","CERTIFY"],
  [0,"BFC","CCW"],
// 
// 0 !KEYWORDS Emerald Night, set 10194, Train
// 
// 0 !HISTORY 2012-12-28 [PTadmin] Official Update 2012-03
// 
// 
// 1 16 0 -0.25 0 39 0 0 0 0.25 0 0 0 11 box5-12.dat
  [1,16,0,-0.25,0,39,0,0,0,0.25,0,0,0,11, ldraw_lib__box5_12(realsolid)],
// 0 //
// 1 82 21.4 -0.25 2.9 0 0 1.2 0 1 0 -1.2 0 0 2-4ndis.dat
  [1,82,21.4,-0.25,2.9,0,0,1.2,0,1,0,-1.2,0,0, ldraw_lib__2_4ndis(realsolid)],
// 1 82 22.9 -0.25 3.4 0 0 3 0 1 0 -3 0 0 2-4disc.dat
  [1,82,22.9,-0.25,3.4,0,0,3,0,1,0,-3,0,0, ldraw_lib__2_4disc(realsolid)],
// 4 82 -16.2 -0.25 6.4 -16.2 -0.25 -4.3 -13 -0.25 -1.4 -13 -0.25 6.4
  [4,82,-16.2,-0.25,6.4,-16.2,-0.25,-4.3,-13,-0.25,-1.4,-13,-0.25,6.4],
// 4 82 -13 -0.25 -1.4 -16.2 -0.25 -4.3 -7.7 -0.25 -4.3 -7.7 -0.25 -1.4
  [4,82,-13,-0.25,-1.4,-16.2,-0.25,-4.3,-7.7,-0.25,-4.3,-7.7,-0.25,-1.4],
// 4 82 22.9 -0.25 3.4 22.9 -0.25 6.4 22.6 -0.25 4.1 22.6 -0.25 2.9
  [4,82,22.9,-0.25,3.4,22.9,-0.25,6.4,22.6,-0.25,4.1,22.6,-0.25,2.9],
// 4 82 22.9 -0.25 0.4 22.9 -0.25 3.4 22.6 -0.25 2.9 22.6 -0.25 1.7
  [4,82,22.9,-0.25,0.4,22.9,-0.25,3.4,22.6,-0.25,2.9,22.6,-0.25,1.7],
// 4 82 22.9 -0.25 0.4 22.6 -0.25 1.7 21.4 -0.25 1.7 20.5 -0.25 -0.4
  [4,82,22.9,-0.25,0.4,22.6,-0.25,1.7,21.4,-0.25,1.7,20.5,-0.25,-0.4],
// 4 82 23.3 -0.25 0.2 22.9 -0.25 0.4 20.5 -0.25 -0.4 21 -0.25 -0.9
  [4,82,23.3,-0.25,0.2,22.9,-0.25,0.4,20.5,-0.25,-0.4,21,-0.25,-0.9],
// 4 82 23.7 -0.25 -0.1 23.3 -0.25 0.2 21 -0.25 -0.9 24 -0.25 -0.5
  [4,82,23.7,-0.25,-0.1,23.3,-0.25,0.2,21,-0.25,-0.9,24,-0.25,-0.5],
// 4 82 24.4 -0.25 -1 24 -0.25 -0.5 21 -0.25 -0.9 24.8 -0.25 -1.7
  [4,82,24.4,-0.25,-1,24,-0.25,-0.5,21,-0.25,-0.9,24.8,-0.25,-1.7],
// 4 82 24.8 -0.25 -1.7 21 -0.25 -0.9 22.6 -0.25 -4.3 26.1 -0.25 -4.3
  [4,82,24.8,-0.25,-1.7,21,-0.25,-0.9,22.6,-0.25,-4.3,26.1,-0.25,-4.3],
// 4 82 19.9 -0.25 -0.2 20.5 -0.25 -0.4 21.4 -0.25 1.7 19 -0.25 1.7
  [4,82,19.9,-0.25,-0.2,20.5,-0.25,-0.4,21.4,-0.25,1.7,19,-0.25,1.7],
// 4 82 19 -0.25 -0.2 19.9 -0.25 -0.2 19 -0.25 1.7 16.2 -0.25 6.4
  [4,82,19,-0.25,-0.2,19.9,-0.25,-0.2,19,-0.25,1.7,16.2,-0.25,6.4],
// 4 82 21.4 -0.25 4.1 22.6 -0.25 4.1 22.9 -0.25 6.4 16.2 -0.25 6.4
  [4,82,21.4,-0.25,4.1,22.6,-0.25,4.1,22.9,-0.25,6.4,16.2,-0.25,6.4],
// 3 82 16.2 -0.25 6.4 19 -0.25 4.1 21.4 -0.25 4.1
  [3,82,16.2,-0.25,6.4,19,-0.25,4.1,21.4,-0.25,4.1],
// 3 82 16.2 -0.25 6.4 19 -0.25 1.7 19 -0.25 4.1
  [3,82,16.2,-0.25,6.4,19,-0.25,1.7,19,-0.25,4.1],
// 4 82 19 -0.25 -0.2 16.2 -0.25 6.4 16.2 -0.25 -4.3 19 -0.25 -1.2
  [4,82,19,-0.25,-0.2,16.2,-0.25,6.4,16.2,-0.25,-4.3,19,-0.25,-1.2],
// 3 82 19 -0.25 -1.2 16.2 -0.25 -4.3 19 -0.25 -4.3
  [3,82,19,-0.25,-1.2,16.2,-0.25,-4.3,19,-0.25,-4.3],
// 0 //
// 4 4 -17.6 -0.25 4.8 -17.6 -0.25 -5.9 -16.2 -0.25 -4.3 -16.2 -0.25 6.4
  [4,4,-17.6,-0.25,4.8,-17.6,-0.25,-5.9,-16.2,-0.25,-4.3,-16.2,-0.25,6.4],
// 4 4 14.8 -0.25 5 14.8 -0.25 -5.9 16.2 -0.25 -4.3 16.2 -0.25 6.4
  [4,4,14.8,-0.25,5,14.8,-0.25,-5.9,16.2,-0.25,-4.3,16.2,-0.25,6.4],
// 0 //
// 1 0 21.4 -0.25 2.9 0 0 1.2 0 1 0 -1.2 0 0 2-4disc.dat
  [1,0,21.4,-0.25,2.9,0,0,1.2,0,1,0,-1.2,0,0, ldraw_lib__2_4disc(realsolid)],
// 4 0 -16.2 -0.25 -4.3 -17.6 -0.25 -5.9 -8.9 -0.25 -5.9 -7.7 -0.25 -4.3
  [4,0,-16.2,-0.25,-4.3,-17.6,-0.25,-5.9,-8.9,-0.25,-5.9,-7.7,-0.25,-4.3],
// 4 0 16.2 -0.25 -4.3 14.8 -0.25 -5.9 18.2 -0.25 -5.9 19 -0.25 -4.3
  [4,0,16.2,-0.25,-4.3,14.8,-0.25,-5.9,18.2,-0.25,-5.9,19,-0.25,-4.3],
// 4 0 22.6 -0.25 -4.3 21.6 -0.25 -5.9 24.9 -0.25 -5.9 26.1 -0.25 -4.3
  [4,0,22.6,-0.25,-4.3,21.6,-0.25,-5.9,24.9,-0.25,-5.9,26.1,-0.25,-4.3],
// 4 0 19 -0.25 -1.2 21.6 -0.25 -5.9 22.6 -0.25 -4.3 21 -0.25 -0.9
  [4,0,19,-0.25,-1.2,21.6,-0.25,-5.9,22.6,-0.25,-4.3,21,-0.25,-0.9],
// 4 0 19.9 -0.25 -0.2 19 -0.25 -0.2 19 -0.25 -1.2 20.5 -0.25 -0.4
  [4,0,19.9,-0.25,-0.2,19,-0.25,-0.2,19,-0.25,-1.2,20.5,-0.25,-0.4],
// 3 0 20.5 -0.25 -0.4 19 -0.25 -1.2 21 -0.25 -0.9
  [3,0,20.5,-0.25,-0.4,19,-0.25,-1.2,21,-0.25,-0.9],
// 3 0 21.4 -0.25 2.9 19 -0.25 1.7 21.4 -0.25 1.7
  [3,0,21.4,-0.25,2.9,19,-0.25,1.7,21.4,-0.25,1.7],
// 4 0 19 -0.25 1.7 21.4 -0.25 2.9 21.4 -0.25 4.1 19 -0.25 4.1
  [4,0,19,-0.25,1.7,21.4,-0.25,2.9,21.4,-0.25,4.1,19,-0.25,4.1],
// 0 //
// 1 16 22.9 -0.25 3.4 0 0 3 0 1 0 -3 0 0 2-4ndis.dat
  [1,16,22.9,-0.25,3.4,0,0,3,0,1,0,-3,0,0, ldraw_lib__2_4ndis(realsolid)],
// 4 16 39 -0.25 -11 39 -0.25 11 25.9 -0.25 6.4 25.9 -0.25 3.4
  [4,16,39,-0.25,-11,39,-0.25,11,25.9,-0.25,6.4,25.9,-0.25,3.4],
// 4 16 39 -0.25 -11 25.9 -0.25 3.4 25.9 -0.25 0.4 26.1 -0.25 -4.3
  [4,16,39,-0.25,-11,25.9,-0.25,3.4,25.9,-0.25,0.4,26.1,-0.25,-4.3],
// 3 16 26.1 -0.25 -4.3 24.9 -0.25 -5.9 39 -0.25 -11
  [3,16,26.1,-0.25,-4.3,24.9,-0.25,-5.9,39,-0.25,-11],
// 3 16 24.9 -0.25 -5.9 21.6 -0.25 -5.9 39 -0.25 -11
  [3,16,24.9,-0.25,-5.9,21.6,-0.25,-5.9,39,-0.25,-11],
// 3 16 22.9 -0.25 0.4 23.3 -0.25 0.2 25.9 -0.25 0.4
  [3,16,22.9,-0.25,0.4,23.3,-0.25,0.2,25.9,-0.25,0.4],
// 3 16 25.9 -0.25 0.4 23.3 -0.25 0.2 23.7 -0.25 -0.1
  [3,16,25.9,-0.25,0.4,23.3,-0.25,0.2,23.7,-0.25,-0.1],
// 4 16 25.9 -0.25 0.4 23.7 -0.25 -0.1 24 -0.25 -0.5 24.4 -0.25 -1
  [4,16,25.9,-0.25,0.4,23.7,-0.25,-0.1,24,-0.25,-0.5,24.4,-0.25,-1],
// 3 16 25.9 -0.25 0.4 24.4 -0.25 -1 24.8 -0.25 -1.7
  [3,16,25.9,-0.25,0.4,24.4,-0.25,-1,24.8,-0.25,-1.7],
// 3 16 25.9 -0.25 0.4 24.8 -0.25 -1.7 26.1 -0.25 -4.3
  [3,16,25.9,-0.25,0.4,24.8,-0.25,-1.7,26.1,-0.25,-4.3],
// 3 16 19 -0.25 -1.2 19 -0.25 -4.3 21.6 -0.25 -5.9
  [3,16,19,-0.25,-1.2,19,-0.25,-4.3,21.6,-0.25,-5.9],
// 3 16 19 -0.25 -4.3 18.2 -0.25 -5.9 21.6 -0.25 -5.9
  [3,16,19,-0.25,-4.3,18.2,-0.25,-5.9,21.6,-0.25,-5.9],
// 3 16 39 -0.25 11 22.9 -0.25 6.4 25.9 -0.25 6.4
  [3,16,39,-0.25,11,22.9,-0.25,6.4,25.9,-0.25,6.4],
// 4 16 16.2 -0.25 6.4 22.9 -0.25 6.4 39 -0.25 11 -39 -0.25 11
  [4,16,16.2,-0.25,6.4,22.9,-0.25,6.4,39,-0.25,11,-39,-0.25,11],
// 3 16 21.6 -0.25 -5.9 18.2 -0.25 -5.9 39 -0.25 -11
  [3,16,21.6,-0.25,-5.9,18.2,-0.25,-5.9,39,-0.25,-11],
// 4 16 39 -0.25 -11 18.2 -0.25 -5.9 14.8 -0.25 -5.9 -39 -0.25 -11
  [4,16,39,-0.25,-11,18.2,-0.25,-5.9,14.8,-0.25,-5.9,-39,-0.25,-11],
// 4 16 -17.6 -0.25 4.8 -39 -0.25 11 -39 -0.25 -11 -17.6 -0.25 -5.9
  [4,16,-17.6,-0.25,4.8,-39,-0.25,11,-39,-0.25,-11,-17.6,-0.25,-5.9],
// 3 16 -8.9 -0.25 -5.9 -17.6 -0.25 -5.9 -39 -0.25 -11
  [3,16,-8.9,-0.25,-5.9,-17.6,-0.25,-5.9,-39,-0.25,-11],
// 3 16 14.8 -0.25 -5.9 -8.9 -0.25 -5.9 -39 -0.25 -11
  [3,16,14.8,-0.25,-5.9,-8.9,-0.25,-5.9,-39,-0.25,-11],
// 3 16 -39 -0.25 11 -17.6 -0.25 4.8 -16.2 -0.25 6.4
  [3,16,-39,-0.25,11,-17.6,-0.25,4.8,-16.2,-0.25,6.4],
// 3 16 -39 -0.25 11 -16.2 -0.25 6.4 -13 -0.25 6.4
  [3,16,-39,-0.25,11,-16.2,-0.25,6.4,-13,-0.25,6.4],
// 4 16 -39 -0.25 11 -13 -0.25 6.4 14.8 -0.25 5 16.2 -0.25 6.4
  [4,16,-39,-0.25,11,-13,-0.25,6.4,14.8,-0.25,5,16.2,-0.25,6.4],
// 4 16 -13 -0.25 6.4 -13 -0.25 -1.4 -7.7 -0.25 -1.4 14.8 -0.25 5
  [4,16,-13,-0.25,6.4,-13,-0.25,-1.4,-7.7,-0.25,-1.4,14.8,-0.25,5],
// 4 16 14.8 -0.25 5 -7.7 -0.25 -1.4 -7.7 -0.25 -4.3 14.8 -0.25 -5.9
  [4,16,14.8,-0.25,5,-7.7,-0.25,-1.4,-7.7,-0.25,-4.3,14.8,-0.25,-5.9],
// 3 16 -7.7 -0.25 -4.3 -8.9 -0.25 -5.9 14.8 -0.25 -5.9
  [3,16,-7.7,-0.25,-4.3,-8.9,-0.25,-5.9,14.8,-0.25,-5.9],
];
module ldraw_lib__4544258j(step=0, col=false, unit=2/5, alt=false, line=0.2, solid=!$preview)
    makepoly(ldraw_lib__4544258j(solid), step=step, col=col, unit=unit, alt=alt, line=line, solid=solid);
ldraw_lib__4544258j(line=0.2);
